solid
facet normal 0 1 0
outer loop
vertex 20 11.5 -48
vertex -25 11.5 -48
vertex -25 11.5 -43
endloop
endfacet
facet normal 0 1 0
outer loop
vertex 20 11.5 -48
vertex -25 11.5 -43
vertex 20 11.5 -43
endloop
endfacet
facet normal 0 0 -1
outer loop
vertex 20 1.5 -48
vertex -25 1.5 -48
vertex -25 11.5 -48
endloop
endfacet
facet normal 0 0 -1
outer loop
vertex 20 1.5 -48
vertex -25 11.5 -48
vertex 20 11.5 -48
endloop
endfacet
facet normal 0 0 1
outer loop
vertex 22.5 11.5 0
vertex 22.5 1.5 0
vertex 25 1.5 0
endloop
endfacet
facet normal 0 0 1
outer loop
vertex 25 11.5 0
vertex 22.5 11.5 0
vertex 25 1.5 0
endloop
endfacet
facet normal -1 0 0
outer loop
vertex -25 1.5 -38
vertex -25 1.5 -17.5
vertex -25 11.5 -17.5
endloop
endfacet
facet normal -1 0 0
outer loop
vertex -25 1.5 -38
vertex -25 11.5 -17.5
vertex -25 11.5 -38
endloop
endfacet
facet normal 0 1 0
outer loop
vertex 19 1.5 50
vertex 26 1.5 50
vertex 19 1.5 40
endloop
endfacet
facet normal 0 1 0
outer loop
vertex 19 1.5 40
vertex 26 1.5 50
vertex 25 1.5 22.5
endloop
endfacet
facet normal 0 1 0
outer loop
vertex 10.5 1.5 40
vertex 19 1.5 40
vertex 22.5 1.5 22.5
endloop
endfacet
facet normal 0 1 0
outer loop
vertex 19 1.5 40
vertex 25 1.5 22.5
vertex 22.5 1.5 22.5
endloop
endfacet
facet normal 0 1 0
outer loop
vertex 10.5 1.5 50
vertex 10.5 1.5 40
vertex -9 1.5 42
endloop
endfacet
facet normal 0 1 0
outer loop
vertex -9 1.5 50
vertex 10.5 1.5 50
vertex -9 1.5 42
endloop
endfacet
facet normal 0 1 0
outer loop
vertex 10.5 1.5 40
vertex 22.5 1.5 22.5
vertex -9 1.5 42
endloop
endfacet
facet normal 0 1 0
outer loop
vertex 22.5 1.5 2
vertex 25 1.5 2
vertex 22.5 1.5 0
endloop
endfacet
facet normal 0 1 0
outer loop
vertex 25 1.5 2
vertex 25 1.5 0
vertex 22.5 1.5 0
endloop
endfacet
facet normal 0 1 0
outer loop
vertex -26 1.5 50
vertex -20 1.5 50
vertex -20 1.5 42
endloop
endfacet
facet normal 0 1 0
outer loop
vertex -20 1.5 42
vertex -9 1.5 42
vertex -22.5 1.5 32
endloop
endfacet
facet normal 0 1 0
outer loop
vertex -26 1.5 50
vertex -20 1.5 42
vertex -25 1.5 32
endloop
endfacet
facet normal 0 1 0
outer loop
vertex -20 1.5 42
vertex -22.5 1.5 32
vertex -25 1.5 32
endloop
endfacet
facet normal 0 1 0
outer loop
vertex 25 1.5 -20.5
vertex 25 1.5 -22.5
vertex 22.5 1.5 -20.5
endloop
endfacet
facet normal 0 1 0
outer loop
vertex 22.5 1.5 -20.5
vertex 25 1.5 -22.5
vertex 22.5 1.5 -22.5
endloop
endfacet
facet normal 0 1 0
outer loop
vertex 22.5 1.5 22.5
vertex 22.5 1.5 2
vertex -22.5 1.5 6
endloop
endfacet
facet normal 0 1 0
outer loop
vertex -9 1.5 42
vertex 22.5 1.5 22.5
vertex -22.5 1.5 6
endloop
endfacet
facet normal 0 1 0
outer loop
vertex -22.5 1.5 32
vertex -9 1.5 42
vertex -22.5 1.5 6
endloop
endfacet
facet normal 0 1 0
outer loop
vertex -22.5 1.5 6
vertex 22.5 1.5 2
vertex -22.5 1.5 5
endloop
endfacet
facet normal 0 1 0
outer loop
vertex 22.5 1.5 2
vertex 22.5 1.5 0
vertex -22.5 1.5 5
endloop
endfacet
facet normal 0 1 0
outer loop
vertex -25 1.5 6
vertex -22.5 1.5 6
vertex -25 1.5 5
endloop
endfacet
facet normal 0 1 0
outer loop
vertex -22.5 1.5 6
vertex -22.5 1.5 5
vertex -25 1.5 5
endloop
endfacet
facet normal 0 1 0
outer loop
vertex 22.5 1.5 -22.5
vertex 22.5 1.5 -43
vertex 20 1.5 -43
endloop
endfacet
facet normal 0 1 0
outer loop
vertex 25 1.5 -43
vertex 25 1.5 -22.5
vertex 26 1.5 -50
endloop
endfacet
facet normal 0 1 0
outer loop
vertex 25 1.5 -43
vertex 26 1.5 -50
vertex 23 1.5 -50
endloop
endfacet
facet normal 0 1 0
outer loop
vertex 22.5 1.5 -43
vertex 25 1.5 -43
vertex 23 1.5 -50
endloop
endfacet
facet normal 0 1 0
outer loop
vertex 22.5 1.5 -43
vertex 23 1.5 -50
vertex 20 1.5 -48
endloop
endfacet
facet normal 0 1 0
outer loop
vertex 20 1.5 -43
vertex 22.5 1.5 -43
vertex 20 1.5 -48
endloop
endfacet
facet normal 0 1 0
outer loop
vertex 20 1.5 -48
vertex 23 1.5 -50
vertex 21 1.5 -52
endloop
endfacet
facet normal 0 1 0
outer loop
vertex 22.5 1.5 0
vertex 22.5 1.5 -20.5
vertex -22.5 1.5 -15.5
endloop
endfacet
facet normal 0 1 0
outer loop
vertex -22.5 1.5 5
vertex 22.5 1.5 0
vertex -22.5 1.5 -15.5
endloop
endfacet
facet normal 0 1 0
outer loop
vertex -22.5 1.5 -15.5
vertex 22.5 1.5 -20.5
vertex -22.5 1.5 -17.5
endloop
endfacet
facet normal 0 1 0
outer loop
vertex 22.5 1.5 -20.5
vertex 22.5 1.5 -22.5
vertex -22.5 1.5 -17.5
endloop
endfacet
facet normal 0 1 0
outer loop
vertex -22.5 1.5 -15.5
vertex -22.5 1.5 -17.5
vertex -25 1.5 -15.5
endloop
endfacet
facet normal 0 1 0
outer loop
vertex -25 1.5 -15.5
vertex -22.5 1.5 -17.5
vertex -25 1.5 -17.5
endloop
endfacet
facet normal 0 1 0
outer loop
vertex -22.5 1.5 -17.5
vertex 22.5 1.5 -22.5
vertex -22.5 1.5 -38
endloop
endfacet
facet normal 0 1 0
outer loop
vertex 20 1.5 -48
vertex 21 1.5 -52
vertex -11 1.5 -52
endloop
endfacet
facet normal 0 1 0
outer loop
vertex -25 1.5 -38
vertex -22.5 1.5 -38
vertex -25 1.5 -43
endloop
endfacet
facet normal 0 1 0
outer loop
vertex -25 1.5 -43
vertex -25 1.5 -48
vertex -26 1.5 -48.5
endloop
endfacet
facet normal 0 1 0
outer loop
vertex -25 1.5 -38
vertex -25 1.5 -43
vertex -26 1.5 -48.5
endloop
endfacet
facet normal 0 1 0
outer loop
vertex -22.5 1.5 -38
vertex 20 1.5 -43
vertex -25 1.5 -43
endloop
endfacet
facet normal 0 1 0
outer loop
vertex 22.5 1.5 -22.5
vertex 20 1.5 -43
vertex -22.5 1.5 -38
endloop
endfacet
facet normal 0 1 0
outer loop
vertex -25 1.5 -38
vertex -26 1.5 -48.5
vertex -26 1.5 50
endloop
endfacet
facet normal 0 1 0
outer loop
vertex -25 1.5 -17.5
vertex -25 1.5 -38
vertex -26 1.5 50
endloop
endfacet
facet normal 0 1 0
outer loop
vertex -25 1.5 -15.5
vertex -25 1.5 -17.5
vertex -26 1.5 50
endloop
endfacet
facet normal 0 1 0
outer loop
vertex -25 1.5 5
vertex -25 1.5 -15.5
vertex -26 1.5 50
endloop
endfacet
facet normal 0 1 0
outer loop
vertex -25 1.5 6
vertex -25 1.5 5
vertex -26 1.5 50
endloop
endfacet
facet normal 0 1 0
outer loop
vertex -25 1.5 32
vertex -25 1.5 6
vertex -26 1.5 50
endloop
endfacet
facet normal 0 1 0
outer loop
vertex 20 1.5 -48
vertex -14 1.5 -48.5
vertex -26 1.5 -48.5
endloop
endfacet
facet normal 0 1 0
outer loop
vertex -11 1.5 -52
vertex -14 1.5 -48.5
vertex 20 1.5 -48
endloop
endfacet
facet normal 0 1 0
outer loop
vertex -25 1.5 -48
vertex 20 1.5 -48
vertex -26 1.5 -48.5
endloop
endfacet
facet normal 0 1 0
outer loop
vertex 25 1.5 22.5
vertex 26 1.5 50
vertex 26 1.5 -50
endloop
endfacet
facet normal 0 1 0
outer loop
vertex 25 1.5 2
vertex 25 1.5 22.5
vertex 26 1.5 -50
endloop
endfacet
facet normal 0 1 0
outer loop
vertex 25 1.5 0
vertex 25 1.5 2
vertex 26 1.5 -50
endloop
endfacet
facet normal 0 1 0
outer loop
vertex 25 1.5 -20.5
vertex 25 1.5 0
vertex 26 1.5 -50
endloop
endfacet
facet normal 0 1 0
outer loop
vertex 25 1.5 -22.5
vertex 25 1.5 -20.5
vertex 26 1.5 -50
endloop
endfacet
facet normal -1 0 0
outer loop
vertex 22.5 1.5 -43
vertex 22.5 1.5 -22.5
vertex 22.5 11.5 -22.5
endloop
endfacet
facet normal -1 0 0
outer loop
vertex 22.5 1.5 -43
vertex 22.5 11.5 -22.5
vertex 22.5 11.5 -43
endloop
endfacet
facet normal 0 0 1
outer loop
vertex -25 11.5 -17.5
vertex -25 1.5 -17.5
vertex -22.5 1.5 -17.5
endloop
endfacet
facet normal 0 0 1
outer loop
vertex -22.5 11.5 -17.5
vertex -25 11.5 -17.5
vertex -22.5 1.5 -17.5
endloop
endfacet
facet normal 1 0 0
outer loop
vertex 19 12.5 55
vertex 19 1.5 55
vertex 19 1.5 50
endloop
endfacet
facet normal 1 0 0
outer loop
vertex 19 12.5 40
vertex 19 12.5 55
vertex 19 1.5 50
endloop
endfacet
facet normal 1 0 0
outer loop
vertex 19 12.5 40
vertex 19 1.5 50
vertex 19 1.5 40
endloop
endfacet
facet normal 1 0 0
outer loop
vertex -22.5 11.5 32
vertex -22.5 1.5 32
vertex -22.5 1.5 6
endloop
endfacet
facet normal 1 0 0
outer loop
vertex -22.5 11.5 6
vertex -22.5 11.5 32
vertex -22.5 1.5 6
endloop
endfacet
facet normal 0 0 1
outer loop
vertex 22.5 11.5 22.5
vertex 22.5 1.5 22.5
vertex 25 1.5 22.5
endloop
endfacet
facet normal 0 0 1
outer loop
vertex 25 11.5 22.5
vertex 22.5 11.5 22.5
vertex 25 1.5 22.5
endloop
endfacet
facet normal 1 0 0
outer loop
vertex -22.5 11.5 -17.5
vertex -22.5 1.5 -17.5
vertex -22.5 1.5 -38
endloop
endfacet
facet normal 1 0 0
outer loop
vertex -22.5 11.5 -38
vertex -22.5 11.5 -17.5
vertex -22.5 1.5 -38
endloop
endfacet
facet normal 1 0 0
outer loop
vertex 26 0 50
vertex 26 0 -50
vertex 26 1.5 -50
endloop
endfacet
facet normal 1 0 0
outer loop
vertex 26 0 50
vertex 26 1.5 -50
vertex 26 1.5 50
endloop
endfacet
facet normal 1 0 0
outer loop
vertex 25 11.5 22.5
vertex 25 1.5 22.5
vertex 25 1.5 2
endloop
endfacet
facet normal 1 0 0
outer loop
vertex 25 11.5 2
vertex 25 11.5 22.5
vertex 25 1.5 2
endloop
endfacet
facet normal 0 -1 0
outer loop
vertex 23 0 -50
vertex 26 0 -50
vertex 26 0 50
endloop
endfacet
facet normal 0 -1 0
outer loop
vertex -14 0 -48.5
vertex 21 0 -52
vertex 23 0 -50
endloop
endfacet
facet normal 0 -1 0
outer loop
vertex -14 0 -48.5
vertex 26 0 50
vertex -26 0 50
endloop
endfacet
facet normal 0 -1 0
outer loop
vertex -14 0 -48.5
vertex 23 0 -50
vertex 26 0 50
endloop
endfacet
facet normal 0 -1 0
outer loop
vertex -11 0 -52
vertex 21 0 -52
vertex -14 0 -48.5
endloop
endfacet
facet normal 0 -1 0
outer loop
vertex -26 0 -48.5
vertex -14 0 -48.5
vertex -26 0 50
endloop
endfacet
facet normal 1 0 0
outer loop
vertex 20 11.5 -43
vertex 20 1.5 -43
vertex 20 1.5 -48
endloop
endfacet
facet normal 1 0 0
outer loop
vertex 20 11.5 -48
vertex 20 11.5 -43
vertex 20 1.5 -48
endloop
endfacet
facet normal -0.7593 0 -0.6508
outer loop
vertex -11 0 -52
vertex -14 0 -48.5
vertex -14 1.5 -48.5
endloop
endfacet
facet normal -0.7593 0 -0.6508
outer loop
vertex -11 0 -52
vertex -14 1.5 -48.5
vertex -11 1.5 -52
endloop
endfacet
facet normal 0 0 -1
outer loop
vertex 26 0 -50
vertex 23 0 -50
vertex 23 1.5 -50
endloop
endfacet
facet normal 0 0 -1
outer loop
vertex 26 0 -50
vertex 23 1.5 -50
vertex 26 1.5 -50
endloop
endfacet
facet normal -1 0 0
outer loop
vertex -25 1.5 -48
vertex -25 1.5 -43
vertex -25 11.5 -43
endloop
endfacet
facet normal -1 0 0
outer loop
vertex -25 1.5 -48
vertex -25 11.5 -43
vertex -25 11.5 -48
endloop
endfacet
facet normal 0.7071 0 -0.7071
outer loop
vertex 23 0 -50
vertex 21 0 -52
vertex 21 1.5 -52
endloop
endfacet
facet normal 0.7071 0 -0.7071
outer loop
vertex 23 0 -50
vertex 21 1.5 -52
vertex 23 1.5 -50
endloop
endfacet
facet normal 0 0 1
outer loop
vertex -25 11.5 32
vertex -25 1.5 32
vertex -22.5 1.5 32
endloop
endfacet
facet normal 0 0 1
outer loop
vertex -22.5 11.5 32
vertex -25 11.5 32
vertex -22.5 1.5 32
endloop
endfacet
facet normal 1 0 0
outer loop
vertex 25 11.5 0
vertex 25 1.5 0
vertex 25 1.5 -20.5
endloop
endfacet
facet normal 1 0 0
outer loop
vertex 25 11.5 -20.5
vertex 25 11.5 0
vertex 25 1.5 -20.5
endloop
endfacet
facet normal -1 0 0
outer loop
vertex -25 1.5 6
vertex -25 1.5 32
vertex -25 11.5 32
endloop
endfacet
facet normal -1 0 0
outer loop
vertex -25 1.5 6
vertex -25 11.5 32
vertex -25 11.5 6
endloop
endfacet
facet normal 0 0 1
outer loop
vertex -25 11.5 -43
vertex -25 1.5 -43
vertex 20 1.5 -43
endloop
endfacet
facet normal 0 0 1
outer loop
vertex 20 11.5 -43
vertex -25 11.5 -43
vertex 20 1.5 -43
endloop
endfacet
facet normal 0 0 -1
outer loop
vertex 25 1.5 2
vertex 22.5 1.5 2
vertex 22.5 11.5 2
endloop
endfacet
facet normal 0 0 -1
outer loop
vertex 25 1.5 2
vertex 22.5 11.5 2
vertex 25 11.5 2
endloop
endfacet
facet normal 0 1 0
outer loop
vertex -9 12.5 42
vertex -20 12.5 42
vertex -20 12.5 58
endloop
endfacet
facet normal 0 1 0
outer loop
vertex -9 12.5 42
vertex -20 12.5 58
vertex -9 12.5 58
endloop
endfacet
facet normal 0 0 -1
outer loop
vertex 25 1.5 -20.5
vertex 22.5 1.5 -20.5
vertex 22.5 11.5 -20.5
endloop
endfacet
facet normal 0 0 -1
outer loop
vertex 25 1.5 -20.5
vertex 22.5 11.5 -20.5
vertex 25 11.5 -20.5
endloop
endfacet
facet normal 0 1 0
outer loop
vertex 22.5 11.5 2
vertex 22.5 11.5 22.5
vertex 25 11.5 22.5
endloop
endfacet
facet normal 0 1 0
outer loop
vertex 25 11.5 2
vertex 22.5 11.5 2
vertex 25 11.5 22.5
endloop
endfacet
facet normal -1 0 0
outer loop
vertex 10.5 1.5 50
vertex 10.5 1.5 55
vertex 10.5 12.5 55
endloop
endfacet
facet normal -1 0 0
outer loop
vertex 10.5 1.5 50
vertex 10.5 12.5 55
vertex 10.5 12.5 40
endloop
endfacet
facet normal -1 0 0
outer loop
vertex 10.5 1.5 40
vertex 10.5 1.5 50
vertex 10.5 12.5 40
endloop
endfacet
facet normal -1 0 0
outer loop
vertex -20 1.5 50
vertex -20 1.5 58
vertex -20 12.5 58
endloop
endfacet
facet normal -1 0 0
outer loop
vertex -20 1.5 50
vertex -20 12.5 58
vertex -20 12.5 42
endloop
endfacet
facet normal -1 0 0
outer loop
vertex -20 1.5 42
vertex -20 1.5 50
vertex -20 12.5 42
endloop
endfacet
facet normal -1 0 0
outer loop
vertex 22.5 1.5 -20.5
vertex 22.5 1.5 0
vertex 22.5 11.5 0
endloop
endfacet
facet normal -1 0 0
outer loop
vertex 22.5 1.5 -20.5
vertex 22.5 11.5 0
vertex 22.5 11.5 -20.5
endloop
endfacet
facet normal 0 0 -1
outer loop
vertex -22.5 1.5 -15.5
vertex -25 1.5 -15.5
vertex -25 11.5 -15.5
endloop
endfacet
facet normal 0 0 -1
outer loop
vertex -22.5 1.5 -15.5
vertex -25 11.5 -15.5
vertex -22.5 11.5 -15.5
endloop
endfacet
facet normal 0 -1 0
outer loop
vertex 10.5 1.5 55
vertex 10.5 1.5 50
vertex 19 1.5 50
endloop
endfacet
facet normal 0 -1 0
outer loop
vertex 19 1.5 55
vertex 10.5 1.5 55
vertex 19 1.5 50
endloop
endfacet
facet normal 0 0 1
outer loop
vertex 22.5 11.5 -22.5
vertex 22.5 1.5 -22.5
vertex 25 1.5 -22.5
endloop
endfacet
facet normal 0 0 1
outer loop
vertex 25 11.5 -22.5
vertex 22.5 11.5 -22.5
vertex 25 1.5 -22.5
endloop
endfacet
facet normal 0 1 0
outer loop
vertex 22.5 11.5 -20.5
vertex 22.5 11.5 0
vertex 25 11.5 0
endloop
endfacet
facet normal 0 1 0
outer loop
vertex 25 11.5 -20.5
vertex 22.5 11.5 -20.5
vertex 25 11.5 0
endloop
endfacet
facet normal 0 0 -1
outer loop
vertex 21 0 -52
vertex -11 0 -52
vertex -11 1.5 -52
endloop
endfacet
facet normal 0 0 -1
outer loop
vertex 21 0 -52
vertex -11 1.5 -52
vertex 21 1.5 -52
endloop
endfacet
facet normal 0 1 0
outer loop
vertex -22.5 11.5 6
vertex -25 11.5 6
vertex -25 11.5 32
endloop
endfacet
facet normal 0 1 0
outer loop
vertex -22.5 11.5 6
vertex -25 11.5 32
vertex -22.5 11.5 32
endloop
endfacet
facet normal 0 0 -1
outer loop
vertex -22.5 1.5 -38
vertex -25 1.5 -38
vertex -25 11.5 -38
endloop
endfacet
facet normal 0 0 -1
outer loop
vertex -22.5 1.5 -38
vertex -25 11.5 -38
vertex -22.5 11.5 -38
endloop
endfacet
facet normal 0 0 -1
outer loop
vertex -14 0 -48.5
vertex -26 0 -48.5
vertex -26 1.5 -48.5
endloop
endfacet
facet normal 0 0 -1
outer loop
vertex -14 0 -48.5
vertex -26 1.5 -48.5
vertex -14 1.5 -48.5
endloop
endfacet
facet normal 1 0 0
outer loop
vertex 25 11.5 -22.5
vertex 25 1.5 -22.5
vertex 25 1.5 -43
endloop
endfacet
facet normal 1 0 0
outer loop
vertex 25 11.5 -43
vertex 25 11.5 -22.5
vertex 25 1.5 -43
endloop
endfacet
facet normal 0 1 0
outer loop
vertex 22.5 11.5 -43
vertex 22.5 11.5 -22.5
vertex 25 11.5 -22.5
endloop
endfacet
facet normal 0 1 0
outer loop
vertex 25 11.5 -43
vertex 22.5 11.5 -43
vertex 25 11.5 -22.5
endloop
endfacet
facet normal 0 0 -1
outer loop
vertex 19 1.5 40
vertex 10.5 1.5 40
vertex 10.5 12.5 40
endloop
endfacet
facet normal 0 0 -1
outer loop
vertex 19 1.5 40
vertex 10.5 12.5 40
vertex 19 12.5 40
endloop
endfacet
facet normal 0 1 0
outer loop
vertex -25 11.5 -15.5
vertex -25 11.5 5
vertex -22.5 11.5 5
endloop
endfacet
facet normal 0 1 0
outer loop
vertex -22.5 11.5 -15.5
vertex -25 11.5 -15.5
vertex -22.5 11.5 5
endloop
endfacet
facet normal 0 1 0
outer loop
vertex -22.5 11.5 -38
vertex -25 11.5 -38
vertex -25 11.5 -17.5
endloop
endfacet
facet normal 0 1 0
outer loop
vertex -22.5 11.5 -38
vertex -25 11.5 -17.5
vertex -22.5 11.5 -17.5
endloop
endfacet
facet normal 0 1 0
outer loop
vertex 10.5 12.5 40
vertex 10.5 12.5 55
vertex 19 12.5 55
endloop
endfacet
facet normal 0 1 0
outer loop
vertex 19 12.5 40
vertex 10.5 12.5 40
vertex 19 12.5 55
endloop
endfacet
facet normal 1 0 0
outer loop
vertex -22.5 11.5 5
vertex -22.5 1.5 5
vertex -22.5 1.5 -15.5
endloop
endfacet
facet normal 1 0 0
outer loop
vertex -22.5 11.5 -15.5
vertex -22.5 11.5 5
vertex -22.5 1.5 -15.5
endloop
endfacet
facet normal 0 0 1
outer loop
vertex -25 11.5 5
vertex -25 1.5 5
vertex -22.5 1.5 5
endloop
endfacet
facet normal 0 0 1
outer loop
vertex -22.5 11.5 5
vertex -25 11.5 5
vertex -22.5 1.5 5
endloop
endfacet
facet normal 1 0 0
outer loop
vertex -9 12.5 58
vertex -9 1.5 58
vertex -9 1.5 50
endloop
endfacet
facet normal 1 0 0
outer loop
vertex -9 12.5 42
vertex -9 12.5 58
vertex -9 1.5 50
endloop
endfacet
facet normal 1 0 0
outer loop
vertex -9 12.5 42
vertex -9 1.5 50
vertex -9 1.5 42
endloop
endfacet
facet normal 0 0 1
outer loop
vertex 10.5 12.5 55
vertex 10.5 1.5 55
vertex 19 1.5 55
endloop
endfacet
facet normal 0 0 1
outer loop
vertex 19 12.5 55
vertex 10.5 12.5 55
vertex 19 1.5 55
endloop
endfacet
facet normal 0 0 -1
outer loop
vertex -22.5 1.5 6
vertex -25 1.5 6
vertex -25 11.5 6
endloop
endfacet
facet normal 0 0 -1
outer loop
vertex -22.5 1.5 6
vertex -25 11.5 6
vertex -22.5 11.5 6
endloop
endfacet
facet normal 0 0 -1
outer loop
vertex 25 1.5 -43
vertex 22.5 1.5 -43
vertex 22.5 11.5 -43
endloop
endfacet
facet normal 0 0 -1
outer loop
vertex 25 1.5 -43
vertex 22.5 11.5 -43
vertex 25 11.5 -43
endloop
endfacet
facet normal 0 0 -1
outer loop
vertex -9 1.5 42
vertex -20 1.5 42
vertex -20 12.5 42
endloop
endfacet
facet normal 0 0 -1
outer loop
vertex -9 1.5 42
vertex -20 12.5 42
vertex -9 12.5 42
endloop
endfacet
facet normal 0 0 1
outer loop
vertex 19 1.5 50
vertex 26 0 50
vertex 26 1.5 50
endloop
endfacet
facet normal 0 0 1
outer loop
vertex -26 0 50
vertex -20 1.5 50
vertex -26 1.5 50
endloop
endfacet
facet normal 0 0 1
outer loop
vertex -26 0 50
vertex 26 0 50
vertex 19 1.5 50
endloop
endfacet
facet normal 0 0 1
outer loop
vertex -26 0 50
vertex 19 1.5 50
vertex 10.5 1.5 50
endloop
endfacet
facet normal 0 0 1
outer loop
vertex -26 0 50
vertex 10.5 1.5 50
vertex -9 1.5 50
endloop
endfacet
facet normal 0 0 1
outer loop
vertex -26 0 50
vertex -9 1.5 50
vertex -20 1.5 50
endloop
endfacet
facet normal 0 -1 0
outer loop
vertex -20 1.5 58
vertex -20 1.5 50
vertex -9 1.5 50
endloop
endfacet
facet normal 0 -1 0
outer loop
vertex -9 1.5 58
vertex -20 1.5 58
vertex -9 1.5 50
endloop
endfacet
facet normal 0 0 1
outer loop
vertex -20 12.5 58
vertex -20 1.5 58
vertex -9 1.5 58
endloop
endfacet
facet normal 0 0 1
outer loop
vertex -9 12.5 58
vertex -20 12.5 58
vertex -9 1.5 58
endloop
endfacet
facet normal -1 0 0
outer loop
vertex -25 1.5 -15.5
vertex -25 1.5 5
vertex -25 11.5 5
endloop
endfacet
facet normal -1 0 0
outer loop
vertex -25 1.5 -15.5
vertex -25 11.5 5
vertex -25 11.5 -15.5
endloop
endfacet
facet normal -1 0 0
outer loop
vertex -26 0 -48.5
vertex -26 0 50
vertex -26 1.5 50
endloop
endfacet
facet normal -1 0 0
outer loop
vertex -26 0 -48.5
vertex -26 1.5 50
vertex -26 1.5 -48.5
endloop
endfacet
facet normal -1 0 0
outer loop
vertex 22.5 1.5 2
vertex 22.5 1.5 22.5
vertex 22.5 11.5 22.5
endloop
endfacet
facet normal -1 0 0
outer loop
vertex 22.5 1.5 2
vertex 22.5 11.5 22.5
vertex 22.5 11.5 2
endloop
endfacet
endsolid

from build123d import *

# Parameters (mm, degrees)
BOSS_EXTRUDE1_DEPTH = 1.5
SKETCH2_W           = 45
SKETCH2_H           = 5
SKETCH2_W_2         = 2.5
SKETCH2_H_2         = 20.5
SKETCH2_H_3         = 26
BOSS_EXTRUDE2_DEPTH = 10
SKETCH3_W           = 8.5
SKETCH3_H           = 15
BOSS_EXTRUDE3_DEPTH = 11
SKETCH4_W           = 11
SKETCH4_H           = 16
BOSS_EXTRUDE4_DEPTH = 11


with BuildPart() as part:
    # Sketch1 → Boss-Extrude1 (new body)
    with BuildSketch(Plane(origin=(0, 0, 0), x_dir=(1, 0, 0), z_dir=(0, 1, 0))):
        Polygon((-26, 48.5), (-14, 48.5), (-11, 52), (21, 52), (23, 50), (26, 50), (26, -50), (-26, -50), align=None)
    extrude(amount=BOSS_EXTRUDE1_DEPTH)

    # Sketch2 → Boss-Extrude2 (add)
    with BuildSketch(Plane(origin=(0, 1.5, 0), x_dir=(1, 0, 0), z_dir=(0, 1, 0))):
        with Locations((-2.5, 45.5)):
            Rectangle(SKETCH2_W, SKETCH2_H)
        with Locations((-23.75, 27.75)):
            Rectangle(SKETCH2_W_2, SKETCH2_H_2)
        with Locations((-23.75, 5.25)):
            Rectangle(SKETCH2_W_2, SKETCH2_H_2)
        with Locations((-23.75, -19)):
            Rectangle(SKETCH2_W_2, SKETCH2_H_3)
        with Locations((23.75, 10.25)):
            Rectangle(SKETCH2_W_2, SKETCH2_H_2)
        with Locations((23.75, 32.75)):
            Rectangle(SKETCH2_W_2, SKETCH2_H_2)
        with Locations((23.75, -12.25)):
            Rectangle(SKETCH2_W_2, SKETCH2_H_2)
    extrude(amount=BOSS_EXTRUDE2_DEPTH)

    # Sketch3 → Boss-Extrude3 (add)
    with BuildSketch(Plane(origin=(0, 1.5, 0), x_dir=(1, 0, 0), z_dir=(0, 1, 0))):
        with Locations((14.75, -47.5)):
            Rectangle(SKETCH3_W, SKETCH3_H)
    extrude(amount=BOSS_EXTRUDE3_DEPTH)

    # Sketch4 → Boss-Extrude4 (add)
    with BuildSketch(Plane(origin=(0, 1.5, 0), x_dir=(1, 0, 0), z_dir=(0, 1, 0))):
        with Locations((-14.5, -50)):
            Rectangle(SKETCH4_W, SKETCH4_H)
    extrude(amount=BOSS_EXTRUDE4_DEPTH)


solid = part.part
